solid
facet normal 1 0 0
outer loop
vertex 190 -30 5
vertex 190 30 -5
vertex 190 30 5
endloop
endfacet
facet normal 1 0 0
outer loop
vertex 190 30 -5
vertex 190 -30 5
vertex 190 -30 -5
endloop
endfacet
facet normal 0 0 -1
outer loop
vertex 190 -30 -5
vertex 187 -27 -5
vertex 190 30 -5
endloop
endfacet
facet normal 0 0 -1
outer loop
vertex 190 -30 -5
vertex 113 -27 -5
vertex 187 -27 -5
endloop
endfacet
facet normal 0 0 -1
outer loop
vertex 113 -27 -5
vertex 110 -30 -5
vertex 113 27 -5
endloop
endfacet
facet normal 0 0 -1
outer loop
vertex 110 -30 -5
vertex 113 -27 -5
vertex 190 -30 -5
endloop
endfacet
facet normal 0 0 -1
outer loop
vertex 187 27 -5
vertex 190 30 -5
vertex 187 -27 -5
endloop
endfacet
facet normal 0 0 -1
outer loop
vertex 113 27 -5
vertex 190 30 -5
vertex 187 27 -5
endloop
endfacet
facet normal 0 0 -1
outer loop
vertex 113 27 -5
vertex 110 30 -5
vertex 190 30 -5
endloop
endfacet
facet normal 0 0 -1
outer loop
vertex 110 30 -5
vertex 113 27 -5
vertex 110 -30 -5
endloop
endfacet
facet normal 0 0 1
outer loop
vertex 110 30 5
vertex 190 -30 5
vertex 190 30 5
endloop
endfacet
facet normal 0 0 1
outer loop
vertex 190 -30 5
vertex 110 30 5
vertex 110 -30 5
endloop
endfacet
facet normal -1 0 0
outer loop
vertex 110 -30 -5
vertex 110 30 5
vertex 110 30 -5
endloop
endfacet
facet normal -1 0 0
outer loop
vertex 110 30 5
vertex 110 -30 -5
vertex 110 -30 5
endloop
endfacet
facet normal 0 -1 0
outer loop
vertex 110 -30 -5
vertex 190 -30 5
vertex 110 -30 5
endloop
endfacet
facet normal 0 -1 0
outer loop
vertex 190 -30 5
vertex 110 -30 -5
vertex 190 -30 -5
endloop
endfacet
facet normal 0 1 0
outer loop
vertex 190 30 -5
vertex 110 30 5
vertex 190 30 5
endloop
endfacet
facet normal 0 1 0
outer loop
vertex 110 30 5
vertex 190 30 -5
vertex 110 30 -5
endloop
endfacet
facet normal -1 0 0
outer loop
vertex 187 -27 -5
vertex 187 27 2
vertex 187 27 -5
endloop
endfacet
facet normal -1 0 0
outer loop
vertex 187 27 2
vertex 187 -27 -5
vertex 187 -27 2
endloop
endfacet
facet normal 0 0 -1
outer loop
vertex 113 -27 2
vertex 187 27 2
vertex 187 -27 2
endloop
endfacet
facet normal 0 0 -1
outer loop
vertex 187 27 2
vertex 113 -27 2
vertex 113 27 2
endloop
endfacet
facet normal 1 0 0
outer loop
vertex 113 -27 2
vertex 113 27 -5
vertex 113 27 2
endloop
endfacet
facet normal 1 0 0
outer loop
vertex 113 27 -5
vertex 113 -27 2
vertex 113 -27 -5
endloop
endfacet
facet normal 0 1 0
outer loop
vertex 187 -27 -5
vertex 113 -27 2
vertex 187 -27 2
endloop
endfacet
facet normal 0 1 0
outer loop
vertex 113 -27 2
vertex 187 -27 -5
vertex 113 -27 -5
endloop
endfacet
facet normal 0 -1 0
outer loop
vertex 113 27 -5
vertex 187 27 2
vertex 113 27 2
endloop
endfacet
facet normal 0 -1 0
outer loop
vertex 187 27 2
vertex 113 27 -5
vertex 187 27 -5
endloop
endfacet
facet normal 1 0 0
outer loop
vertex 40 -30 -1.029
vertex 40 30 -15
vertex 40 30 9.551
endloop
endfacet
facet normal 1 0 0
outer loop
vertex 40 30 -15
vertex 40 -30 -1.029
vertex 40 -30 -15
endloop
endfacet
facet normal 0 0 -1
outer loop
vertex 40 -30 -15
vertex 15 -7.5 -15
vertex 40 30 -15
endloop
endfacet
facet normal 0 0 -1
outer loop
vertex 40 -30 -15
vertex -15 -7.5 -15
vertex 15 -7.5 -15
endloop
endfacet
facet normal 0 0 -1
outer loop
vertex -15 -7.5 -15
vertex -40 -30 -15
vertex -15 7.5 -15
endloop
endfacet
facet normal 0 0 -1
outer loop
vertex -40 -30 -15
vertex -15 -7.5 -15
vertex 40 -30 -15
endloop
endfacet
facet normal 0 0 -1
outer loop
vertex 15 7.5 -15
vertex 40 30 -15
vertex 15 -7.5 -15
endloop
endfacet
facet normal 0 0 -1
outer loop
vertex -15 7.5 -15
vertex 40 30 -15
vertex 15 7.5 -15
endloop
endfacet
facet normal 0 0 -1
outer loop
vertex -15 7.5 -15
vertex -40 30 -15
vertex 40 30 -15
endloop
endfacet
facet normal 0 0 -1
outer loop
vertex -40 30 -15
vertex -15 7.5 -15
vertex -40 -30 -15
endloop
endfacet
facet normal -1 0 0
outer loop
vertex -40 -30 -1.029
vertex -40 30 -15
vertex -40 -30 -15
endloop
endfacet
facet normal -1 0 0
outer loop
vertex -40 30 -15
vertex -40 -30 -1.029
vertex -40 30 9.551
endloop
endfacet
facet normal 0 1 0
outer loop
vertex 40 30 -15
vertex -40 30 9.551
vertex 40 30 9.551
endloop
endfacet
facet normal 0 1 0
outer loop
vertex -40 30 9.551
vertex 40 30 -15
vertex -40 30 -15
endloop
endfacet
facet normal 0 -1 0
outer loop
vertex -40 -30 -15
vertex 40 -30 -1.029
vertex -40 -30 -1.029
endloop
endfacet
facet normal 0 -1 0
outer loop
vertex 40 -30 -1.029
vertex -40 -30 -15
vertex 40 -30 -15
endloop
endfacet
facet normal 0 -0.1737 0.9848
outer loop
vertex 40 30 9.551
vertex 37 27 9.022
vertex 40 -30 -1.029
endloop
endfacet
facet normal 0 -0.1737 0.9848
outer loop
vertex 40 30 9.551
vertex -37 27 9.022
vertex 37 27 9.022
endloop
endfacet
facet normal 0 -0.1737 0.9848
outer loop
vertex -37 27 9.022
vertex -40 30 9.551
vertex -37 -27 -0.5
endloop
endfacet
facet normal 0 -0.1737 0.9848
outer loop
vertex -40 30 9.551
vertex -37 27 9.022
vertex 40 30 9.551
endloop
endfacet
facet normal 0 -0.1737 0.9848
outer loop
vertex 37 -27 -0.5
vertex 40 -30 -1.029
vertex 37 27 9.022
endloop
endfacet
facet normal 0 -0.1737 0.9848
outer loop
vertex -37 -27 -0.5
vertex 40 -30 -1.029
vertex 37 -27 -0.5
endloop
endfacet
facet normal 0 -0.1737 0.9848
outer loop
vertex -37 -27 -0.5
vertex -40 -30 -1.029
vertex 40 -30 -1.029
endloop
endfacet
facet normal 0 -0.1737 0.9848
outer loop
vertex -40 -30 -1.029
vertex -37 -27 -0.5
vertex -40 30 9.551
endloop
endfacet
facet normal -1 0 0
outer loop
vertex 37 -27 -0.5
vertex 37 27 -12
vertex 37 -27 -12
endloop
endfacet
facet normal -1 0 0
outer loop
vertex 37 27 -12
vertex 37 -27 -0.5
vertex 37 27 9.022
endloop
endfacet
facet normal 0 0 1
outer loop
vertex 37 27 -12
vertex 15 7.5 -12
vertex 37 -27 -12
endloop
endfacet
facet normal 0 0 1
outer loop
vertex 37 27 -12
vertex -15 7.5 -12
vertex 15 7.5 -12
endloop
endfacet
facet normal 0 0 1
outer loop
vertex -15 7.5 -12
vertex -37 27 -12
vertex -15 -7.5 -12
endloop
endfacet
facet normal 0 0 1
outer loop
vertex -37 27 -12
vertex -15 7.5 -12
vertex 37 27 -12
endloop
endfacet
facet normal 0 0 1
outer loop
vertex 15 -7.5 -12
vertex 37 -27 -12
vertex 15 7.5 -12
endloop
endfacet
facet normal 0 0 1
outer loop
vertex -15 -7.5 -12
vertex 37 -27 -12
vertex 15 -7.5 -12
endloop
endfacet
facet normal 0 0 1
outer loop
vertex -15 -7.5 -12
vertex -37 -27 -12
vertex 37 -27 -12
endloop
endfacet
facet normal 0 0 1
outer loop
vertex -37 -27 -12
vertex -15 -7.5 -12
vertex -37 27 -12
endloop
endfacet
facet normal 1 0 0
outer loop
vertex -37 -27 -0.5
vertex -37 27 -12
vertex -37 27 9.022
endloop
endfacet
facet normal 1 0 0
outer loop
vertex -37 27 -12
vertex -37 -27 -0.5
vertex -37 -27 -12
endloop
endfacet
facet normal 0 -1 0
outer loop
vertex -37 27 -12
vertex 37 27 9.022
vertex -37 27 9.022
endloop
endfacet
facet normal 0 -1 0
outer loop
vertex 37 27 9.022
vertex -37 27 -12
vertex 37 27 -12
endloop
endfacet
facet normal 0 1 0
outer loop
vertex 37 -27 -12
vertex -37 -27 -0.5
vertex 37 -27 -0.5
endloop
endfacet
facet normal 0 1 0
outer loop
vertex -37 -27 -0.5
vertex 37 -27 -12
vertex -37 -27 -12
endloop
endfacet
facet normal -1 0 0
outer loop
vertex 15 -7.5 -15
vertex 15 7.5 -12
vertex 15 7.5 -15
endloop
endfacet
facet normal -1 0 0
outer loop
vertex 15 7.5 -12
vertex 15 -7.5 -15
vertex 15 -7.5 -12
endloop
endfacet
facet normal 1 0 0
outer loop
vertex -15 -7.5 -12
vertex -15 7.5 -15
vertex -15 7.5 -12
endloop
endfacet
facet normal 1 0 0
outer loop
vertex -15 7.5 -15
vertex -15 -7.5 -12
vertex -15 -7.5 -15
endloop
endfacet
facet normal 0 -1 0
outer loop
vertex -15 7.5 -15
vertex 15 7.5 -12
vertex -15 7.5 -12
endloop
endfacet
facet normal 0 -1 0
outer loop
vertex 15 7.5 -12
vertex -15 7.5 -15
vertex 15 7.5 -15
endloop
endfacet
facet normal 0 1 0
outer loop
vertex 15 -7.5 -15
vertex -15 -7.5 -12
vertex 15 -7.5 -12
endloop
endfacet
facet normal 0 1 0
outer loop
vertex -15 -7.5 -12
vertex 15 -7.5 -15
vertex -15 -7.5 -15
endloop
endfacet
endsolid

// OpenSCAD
arduino_width=80;
arduino_length=60;
case_height=30;
box_thickness=3;
port_width=30;
port_length=15;
port_height=60;
top_height=10;


// Comment these
length = 86;
width= 46;

// outside box dimension
height = 19;
length2=30;
lengtho2=44;
width2=40;
lengthtwo=80;

// Possibly height of cutting tool
height2=18;


height20 = 19;


height22=16;
lengthhole=25;
length2hole=40;
widthhole=15;
width2hole= 30;
heighthole=8;
dhole=5;
depthhole=8;

// Create basic shell width
shellWidth = 3;
dividerFromTop = 30;

slope_angle=10;

module rotated_cube(angle){
    rotate([angle, 0, 0]){
        cube(size=[arduino_width+10,arduino_length+50,case_height+1], center=true);
    }
}


module  createCaseBottom() {
    difference(){
        cube(size=[arduino_width,arduino_length,case_height], center=true);
        
       translate([0,0,20])
        rotated_cube(slope_angle);
       
        cube(size=[arduino_width-(2*box_thickness),arduino_length-(2*box_thickness),case_height-(2*box_thickness)], center=true);
        
        cube(size=[port_width,port_length,port_height],center=true);
        
    }
        
}
module createCaseTop() {
        difference(){
            cube(size=[arduino_width,arduino_length,top_height], center=true);
            
            translate([0,0,box_thickness])
                cube(size=[arduino_width-(2*box_thickness),arduino_length-(2*box_thickness),top_height], center=true);
        }
        
       
}
module Case_top(){
    rotate([180, 0, 0]){
    createCaseTop();
    }
     //translate([7,30,15]){
          //  cylinder(depthhole,dhole/2,dhole/2,center=false);
        
       // translate([17,30,15]){
        //    cylinder(depthhole,dhole/2,dhole/2,center=false);
        
        //translate([27,30,15]){
         //   cylinder(depthhole,dhole/2,dhole/2,center=false);
        
       // #translate([40,10,14]){
          //  cube(size=[length2hole,width2hole,heighthole],center=false);
        

}

translate([150,0,0])
 Case_top();
translate([0,0,0])
 createCaseBottom();
